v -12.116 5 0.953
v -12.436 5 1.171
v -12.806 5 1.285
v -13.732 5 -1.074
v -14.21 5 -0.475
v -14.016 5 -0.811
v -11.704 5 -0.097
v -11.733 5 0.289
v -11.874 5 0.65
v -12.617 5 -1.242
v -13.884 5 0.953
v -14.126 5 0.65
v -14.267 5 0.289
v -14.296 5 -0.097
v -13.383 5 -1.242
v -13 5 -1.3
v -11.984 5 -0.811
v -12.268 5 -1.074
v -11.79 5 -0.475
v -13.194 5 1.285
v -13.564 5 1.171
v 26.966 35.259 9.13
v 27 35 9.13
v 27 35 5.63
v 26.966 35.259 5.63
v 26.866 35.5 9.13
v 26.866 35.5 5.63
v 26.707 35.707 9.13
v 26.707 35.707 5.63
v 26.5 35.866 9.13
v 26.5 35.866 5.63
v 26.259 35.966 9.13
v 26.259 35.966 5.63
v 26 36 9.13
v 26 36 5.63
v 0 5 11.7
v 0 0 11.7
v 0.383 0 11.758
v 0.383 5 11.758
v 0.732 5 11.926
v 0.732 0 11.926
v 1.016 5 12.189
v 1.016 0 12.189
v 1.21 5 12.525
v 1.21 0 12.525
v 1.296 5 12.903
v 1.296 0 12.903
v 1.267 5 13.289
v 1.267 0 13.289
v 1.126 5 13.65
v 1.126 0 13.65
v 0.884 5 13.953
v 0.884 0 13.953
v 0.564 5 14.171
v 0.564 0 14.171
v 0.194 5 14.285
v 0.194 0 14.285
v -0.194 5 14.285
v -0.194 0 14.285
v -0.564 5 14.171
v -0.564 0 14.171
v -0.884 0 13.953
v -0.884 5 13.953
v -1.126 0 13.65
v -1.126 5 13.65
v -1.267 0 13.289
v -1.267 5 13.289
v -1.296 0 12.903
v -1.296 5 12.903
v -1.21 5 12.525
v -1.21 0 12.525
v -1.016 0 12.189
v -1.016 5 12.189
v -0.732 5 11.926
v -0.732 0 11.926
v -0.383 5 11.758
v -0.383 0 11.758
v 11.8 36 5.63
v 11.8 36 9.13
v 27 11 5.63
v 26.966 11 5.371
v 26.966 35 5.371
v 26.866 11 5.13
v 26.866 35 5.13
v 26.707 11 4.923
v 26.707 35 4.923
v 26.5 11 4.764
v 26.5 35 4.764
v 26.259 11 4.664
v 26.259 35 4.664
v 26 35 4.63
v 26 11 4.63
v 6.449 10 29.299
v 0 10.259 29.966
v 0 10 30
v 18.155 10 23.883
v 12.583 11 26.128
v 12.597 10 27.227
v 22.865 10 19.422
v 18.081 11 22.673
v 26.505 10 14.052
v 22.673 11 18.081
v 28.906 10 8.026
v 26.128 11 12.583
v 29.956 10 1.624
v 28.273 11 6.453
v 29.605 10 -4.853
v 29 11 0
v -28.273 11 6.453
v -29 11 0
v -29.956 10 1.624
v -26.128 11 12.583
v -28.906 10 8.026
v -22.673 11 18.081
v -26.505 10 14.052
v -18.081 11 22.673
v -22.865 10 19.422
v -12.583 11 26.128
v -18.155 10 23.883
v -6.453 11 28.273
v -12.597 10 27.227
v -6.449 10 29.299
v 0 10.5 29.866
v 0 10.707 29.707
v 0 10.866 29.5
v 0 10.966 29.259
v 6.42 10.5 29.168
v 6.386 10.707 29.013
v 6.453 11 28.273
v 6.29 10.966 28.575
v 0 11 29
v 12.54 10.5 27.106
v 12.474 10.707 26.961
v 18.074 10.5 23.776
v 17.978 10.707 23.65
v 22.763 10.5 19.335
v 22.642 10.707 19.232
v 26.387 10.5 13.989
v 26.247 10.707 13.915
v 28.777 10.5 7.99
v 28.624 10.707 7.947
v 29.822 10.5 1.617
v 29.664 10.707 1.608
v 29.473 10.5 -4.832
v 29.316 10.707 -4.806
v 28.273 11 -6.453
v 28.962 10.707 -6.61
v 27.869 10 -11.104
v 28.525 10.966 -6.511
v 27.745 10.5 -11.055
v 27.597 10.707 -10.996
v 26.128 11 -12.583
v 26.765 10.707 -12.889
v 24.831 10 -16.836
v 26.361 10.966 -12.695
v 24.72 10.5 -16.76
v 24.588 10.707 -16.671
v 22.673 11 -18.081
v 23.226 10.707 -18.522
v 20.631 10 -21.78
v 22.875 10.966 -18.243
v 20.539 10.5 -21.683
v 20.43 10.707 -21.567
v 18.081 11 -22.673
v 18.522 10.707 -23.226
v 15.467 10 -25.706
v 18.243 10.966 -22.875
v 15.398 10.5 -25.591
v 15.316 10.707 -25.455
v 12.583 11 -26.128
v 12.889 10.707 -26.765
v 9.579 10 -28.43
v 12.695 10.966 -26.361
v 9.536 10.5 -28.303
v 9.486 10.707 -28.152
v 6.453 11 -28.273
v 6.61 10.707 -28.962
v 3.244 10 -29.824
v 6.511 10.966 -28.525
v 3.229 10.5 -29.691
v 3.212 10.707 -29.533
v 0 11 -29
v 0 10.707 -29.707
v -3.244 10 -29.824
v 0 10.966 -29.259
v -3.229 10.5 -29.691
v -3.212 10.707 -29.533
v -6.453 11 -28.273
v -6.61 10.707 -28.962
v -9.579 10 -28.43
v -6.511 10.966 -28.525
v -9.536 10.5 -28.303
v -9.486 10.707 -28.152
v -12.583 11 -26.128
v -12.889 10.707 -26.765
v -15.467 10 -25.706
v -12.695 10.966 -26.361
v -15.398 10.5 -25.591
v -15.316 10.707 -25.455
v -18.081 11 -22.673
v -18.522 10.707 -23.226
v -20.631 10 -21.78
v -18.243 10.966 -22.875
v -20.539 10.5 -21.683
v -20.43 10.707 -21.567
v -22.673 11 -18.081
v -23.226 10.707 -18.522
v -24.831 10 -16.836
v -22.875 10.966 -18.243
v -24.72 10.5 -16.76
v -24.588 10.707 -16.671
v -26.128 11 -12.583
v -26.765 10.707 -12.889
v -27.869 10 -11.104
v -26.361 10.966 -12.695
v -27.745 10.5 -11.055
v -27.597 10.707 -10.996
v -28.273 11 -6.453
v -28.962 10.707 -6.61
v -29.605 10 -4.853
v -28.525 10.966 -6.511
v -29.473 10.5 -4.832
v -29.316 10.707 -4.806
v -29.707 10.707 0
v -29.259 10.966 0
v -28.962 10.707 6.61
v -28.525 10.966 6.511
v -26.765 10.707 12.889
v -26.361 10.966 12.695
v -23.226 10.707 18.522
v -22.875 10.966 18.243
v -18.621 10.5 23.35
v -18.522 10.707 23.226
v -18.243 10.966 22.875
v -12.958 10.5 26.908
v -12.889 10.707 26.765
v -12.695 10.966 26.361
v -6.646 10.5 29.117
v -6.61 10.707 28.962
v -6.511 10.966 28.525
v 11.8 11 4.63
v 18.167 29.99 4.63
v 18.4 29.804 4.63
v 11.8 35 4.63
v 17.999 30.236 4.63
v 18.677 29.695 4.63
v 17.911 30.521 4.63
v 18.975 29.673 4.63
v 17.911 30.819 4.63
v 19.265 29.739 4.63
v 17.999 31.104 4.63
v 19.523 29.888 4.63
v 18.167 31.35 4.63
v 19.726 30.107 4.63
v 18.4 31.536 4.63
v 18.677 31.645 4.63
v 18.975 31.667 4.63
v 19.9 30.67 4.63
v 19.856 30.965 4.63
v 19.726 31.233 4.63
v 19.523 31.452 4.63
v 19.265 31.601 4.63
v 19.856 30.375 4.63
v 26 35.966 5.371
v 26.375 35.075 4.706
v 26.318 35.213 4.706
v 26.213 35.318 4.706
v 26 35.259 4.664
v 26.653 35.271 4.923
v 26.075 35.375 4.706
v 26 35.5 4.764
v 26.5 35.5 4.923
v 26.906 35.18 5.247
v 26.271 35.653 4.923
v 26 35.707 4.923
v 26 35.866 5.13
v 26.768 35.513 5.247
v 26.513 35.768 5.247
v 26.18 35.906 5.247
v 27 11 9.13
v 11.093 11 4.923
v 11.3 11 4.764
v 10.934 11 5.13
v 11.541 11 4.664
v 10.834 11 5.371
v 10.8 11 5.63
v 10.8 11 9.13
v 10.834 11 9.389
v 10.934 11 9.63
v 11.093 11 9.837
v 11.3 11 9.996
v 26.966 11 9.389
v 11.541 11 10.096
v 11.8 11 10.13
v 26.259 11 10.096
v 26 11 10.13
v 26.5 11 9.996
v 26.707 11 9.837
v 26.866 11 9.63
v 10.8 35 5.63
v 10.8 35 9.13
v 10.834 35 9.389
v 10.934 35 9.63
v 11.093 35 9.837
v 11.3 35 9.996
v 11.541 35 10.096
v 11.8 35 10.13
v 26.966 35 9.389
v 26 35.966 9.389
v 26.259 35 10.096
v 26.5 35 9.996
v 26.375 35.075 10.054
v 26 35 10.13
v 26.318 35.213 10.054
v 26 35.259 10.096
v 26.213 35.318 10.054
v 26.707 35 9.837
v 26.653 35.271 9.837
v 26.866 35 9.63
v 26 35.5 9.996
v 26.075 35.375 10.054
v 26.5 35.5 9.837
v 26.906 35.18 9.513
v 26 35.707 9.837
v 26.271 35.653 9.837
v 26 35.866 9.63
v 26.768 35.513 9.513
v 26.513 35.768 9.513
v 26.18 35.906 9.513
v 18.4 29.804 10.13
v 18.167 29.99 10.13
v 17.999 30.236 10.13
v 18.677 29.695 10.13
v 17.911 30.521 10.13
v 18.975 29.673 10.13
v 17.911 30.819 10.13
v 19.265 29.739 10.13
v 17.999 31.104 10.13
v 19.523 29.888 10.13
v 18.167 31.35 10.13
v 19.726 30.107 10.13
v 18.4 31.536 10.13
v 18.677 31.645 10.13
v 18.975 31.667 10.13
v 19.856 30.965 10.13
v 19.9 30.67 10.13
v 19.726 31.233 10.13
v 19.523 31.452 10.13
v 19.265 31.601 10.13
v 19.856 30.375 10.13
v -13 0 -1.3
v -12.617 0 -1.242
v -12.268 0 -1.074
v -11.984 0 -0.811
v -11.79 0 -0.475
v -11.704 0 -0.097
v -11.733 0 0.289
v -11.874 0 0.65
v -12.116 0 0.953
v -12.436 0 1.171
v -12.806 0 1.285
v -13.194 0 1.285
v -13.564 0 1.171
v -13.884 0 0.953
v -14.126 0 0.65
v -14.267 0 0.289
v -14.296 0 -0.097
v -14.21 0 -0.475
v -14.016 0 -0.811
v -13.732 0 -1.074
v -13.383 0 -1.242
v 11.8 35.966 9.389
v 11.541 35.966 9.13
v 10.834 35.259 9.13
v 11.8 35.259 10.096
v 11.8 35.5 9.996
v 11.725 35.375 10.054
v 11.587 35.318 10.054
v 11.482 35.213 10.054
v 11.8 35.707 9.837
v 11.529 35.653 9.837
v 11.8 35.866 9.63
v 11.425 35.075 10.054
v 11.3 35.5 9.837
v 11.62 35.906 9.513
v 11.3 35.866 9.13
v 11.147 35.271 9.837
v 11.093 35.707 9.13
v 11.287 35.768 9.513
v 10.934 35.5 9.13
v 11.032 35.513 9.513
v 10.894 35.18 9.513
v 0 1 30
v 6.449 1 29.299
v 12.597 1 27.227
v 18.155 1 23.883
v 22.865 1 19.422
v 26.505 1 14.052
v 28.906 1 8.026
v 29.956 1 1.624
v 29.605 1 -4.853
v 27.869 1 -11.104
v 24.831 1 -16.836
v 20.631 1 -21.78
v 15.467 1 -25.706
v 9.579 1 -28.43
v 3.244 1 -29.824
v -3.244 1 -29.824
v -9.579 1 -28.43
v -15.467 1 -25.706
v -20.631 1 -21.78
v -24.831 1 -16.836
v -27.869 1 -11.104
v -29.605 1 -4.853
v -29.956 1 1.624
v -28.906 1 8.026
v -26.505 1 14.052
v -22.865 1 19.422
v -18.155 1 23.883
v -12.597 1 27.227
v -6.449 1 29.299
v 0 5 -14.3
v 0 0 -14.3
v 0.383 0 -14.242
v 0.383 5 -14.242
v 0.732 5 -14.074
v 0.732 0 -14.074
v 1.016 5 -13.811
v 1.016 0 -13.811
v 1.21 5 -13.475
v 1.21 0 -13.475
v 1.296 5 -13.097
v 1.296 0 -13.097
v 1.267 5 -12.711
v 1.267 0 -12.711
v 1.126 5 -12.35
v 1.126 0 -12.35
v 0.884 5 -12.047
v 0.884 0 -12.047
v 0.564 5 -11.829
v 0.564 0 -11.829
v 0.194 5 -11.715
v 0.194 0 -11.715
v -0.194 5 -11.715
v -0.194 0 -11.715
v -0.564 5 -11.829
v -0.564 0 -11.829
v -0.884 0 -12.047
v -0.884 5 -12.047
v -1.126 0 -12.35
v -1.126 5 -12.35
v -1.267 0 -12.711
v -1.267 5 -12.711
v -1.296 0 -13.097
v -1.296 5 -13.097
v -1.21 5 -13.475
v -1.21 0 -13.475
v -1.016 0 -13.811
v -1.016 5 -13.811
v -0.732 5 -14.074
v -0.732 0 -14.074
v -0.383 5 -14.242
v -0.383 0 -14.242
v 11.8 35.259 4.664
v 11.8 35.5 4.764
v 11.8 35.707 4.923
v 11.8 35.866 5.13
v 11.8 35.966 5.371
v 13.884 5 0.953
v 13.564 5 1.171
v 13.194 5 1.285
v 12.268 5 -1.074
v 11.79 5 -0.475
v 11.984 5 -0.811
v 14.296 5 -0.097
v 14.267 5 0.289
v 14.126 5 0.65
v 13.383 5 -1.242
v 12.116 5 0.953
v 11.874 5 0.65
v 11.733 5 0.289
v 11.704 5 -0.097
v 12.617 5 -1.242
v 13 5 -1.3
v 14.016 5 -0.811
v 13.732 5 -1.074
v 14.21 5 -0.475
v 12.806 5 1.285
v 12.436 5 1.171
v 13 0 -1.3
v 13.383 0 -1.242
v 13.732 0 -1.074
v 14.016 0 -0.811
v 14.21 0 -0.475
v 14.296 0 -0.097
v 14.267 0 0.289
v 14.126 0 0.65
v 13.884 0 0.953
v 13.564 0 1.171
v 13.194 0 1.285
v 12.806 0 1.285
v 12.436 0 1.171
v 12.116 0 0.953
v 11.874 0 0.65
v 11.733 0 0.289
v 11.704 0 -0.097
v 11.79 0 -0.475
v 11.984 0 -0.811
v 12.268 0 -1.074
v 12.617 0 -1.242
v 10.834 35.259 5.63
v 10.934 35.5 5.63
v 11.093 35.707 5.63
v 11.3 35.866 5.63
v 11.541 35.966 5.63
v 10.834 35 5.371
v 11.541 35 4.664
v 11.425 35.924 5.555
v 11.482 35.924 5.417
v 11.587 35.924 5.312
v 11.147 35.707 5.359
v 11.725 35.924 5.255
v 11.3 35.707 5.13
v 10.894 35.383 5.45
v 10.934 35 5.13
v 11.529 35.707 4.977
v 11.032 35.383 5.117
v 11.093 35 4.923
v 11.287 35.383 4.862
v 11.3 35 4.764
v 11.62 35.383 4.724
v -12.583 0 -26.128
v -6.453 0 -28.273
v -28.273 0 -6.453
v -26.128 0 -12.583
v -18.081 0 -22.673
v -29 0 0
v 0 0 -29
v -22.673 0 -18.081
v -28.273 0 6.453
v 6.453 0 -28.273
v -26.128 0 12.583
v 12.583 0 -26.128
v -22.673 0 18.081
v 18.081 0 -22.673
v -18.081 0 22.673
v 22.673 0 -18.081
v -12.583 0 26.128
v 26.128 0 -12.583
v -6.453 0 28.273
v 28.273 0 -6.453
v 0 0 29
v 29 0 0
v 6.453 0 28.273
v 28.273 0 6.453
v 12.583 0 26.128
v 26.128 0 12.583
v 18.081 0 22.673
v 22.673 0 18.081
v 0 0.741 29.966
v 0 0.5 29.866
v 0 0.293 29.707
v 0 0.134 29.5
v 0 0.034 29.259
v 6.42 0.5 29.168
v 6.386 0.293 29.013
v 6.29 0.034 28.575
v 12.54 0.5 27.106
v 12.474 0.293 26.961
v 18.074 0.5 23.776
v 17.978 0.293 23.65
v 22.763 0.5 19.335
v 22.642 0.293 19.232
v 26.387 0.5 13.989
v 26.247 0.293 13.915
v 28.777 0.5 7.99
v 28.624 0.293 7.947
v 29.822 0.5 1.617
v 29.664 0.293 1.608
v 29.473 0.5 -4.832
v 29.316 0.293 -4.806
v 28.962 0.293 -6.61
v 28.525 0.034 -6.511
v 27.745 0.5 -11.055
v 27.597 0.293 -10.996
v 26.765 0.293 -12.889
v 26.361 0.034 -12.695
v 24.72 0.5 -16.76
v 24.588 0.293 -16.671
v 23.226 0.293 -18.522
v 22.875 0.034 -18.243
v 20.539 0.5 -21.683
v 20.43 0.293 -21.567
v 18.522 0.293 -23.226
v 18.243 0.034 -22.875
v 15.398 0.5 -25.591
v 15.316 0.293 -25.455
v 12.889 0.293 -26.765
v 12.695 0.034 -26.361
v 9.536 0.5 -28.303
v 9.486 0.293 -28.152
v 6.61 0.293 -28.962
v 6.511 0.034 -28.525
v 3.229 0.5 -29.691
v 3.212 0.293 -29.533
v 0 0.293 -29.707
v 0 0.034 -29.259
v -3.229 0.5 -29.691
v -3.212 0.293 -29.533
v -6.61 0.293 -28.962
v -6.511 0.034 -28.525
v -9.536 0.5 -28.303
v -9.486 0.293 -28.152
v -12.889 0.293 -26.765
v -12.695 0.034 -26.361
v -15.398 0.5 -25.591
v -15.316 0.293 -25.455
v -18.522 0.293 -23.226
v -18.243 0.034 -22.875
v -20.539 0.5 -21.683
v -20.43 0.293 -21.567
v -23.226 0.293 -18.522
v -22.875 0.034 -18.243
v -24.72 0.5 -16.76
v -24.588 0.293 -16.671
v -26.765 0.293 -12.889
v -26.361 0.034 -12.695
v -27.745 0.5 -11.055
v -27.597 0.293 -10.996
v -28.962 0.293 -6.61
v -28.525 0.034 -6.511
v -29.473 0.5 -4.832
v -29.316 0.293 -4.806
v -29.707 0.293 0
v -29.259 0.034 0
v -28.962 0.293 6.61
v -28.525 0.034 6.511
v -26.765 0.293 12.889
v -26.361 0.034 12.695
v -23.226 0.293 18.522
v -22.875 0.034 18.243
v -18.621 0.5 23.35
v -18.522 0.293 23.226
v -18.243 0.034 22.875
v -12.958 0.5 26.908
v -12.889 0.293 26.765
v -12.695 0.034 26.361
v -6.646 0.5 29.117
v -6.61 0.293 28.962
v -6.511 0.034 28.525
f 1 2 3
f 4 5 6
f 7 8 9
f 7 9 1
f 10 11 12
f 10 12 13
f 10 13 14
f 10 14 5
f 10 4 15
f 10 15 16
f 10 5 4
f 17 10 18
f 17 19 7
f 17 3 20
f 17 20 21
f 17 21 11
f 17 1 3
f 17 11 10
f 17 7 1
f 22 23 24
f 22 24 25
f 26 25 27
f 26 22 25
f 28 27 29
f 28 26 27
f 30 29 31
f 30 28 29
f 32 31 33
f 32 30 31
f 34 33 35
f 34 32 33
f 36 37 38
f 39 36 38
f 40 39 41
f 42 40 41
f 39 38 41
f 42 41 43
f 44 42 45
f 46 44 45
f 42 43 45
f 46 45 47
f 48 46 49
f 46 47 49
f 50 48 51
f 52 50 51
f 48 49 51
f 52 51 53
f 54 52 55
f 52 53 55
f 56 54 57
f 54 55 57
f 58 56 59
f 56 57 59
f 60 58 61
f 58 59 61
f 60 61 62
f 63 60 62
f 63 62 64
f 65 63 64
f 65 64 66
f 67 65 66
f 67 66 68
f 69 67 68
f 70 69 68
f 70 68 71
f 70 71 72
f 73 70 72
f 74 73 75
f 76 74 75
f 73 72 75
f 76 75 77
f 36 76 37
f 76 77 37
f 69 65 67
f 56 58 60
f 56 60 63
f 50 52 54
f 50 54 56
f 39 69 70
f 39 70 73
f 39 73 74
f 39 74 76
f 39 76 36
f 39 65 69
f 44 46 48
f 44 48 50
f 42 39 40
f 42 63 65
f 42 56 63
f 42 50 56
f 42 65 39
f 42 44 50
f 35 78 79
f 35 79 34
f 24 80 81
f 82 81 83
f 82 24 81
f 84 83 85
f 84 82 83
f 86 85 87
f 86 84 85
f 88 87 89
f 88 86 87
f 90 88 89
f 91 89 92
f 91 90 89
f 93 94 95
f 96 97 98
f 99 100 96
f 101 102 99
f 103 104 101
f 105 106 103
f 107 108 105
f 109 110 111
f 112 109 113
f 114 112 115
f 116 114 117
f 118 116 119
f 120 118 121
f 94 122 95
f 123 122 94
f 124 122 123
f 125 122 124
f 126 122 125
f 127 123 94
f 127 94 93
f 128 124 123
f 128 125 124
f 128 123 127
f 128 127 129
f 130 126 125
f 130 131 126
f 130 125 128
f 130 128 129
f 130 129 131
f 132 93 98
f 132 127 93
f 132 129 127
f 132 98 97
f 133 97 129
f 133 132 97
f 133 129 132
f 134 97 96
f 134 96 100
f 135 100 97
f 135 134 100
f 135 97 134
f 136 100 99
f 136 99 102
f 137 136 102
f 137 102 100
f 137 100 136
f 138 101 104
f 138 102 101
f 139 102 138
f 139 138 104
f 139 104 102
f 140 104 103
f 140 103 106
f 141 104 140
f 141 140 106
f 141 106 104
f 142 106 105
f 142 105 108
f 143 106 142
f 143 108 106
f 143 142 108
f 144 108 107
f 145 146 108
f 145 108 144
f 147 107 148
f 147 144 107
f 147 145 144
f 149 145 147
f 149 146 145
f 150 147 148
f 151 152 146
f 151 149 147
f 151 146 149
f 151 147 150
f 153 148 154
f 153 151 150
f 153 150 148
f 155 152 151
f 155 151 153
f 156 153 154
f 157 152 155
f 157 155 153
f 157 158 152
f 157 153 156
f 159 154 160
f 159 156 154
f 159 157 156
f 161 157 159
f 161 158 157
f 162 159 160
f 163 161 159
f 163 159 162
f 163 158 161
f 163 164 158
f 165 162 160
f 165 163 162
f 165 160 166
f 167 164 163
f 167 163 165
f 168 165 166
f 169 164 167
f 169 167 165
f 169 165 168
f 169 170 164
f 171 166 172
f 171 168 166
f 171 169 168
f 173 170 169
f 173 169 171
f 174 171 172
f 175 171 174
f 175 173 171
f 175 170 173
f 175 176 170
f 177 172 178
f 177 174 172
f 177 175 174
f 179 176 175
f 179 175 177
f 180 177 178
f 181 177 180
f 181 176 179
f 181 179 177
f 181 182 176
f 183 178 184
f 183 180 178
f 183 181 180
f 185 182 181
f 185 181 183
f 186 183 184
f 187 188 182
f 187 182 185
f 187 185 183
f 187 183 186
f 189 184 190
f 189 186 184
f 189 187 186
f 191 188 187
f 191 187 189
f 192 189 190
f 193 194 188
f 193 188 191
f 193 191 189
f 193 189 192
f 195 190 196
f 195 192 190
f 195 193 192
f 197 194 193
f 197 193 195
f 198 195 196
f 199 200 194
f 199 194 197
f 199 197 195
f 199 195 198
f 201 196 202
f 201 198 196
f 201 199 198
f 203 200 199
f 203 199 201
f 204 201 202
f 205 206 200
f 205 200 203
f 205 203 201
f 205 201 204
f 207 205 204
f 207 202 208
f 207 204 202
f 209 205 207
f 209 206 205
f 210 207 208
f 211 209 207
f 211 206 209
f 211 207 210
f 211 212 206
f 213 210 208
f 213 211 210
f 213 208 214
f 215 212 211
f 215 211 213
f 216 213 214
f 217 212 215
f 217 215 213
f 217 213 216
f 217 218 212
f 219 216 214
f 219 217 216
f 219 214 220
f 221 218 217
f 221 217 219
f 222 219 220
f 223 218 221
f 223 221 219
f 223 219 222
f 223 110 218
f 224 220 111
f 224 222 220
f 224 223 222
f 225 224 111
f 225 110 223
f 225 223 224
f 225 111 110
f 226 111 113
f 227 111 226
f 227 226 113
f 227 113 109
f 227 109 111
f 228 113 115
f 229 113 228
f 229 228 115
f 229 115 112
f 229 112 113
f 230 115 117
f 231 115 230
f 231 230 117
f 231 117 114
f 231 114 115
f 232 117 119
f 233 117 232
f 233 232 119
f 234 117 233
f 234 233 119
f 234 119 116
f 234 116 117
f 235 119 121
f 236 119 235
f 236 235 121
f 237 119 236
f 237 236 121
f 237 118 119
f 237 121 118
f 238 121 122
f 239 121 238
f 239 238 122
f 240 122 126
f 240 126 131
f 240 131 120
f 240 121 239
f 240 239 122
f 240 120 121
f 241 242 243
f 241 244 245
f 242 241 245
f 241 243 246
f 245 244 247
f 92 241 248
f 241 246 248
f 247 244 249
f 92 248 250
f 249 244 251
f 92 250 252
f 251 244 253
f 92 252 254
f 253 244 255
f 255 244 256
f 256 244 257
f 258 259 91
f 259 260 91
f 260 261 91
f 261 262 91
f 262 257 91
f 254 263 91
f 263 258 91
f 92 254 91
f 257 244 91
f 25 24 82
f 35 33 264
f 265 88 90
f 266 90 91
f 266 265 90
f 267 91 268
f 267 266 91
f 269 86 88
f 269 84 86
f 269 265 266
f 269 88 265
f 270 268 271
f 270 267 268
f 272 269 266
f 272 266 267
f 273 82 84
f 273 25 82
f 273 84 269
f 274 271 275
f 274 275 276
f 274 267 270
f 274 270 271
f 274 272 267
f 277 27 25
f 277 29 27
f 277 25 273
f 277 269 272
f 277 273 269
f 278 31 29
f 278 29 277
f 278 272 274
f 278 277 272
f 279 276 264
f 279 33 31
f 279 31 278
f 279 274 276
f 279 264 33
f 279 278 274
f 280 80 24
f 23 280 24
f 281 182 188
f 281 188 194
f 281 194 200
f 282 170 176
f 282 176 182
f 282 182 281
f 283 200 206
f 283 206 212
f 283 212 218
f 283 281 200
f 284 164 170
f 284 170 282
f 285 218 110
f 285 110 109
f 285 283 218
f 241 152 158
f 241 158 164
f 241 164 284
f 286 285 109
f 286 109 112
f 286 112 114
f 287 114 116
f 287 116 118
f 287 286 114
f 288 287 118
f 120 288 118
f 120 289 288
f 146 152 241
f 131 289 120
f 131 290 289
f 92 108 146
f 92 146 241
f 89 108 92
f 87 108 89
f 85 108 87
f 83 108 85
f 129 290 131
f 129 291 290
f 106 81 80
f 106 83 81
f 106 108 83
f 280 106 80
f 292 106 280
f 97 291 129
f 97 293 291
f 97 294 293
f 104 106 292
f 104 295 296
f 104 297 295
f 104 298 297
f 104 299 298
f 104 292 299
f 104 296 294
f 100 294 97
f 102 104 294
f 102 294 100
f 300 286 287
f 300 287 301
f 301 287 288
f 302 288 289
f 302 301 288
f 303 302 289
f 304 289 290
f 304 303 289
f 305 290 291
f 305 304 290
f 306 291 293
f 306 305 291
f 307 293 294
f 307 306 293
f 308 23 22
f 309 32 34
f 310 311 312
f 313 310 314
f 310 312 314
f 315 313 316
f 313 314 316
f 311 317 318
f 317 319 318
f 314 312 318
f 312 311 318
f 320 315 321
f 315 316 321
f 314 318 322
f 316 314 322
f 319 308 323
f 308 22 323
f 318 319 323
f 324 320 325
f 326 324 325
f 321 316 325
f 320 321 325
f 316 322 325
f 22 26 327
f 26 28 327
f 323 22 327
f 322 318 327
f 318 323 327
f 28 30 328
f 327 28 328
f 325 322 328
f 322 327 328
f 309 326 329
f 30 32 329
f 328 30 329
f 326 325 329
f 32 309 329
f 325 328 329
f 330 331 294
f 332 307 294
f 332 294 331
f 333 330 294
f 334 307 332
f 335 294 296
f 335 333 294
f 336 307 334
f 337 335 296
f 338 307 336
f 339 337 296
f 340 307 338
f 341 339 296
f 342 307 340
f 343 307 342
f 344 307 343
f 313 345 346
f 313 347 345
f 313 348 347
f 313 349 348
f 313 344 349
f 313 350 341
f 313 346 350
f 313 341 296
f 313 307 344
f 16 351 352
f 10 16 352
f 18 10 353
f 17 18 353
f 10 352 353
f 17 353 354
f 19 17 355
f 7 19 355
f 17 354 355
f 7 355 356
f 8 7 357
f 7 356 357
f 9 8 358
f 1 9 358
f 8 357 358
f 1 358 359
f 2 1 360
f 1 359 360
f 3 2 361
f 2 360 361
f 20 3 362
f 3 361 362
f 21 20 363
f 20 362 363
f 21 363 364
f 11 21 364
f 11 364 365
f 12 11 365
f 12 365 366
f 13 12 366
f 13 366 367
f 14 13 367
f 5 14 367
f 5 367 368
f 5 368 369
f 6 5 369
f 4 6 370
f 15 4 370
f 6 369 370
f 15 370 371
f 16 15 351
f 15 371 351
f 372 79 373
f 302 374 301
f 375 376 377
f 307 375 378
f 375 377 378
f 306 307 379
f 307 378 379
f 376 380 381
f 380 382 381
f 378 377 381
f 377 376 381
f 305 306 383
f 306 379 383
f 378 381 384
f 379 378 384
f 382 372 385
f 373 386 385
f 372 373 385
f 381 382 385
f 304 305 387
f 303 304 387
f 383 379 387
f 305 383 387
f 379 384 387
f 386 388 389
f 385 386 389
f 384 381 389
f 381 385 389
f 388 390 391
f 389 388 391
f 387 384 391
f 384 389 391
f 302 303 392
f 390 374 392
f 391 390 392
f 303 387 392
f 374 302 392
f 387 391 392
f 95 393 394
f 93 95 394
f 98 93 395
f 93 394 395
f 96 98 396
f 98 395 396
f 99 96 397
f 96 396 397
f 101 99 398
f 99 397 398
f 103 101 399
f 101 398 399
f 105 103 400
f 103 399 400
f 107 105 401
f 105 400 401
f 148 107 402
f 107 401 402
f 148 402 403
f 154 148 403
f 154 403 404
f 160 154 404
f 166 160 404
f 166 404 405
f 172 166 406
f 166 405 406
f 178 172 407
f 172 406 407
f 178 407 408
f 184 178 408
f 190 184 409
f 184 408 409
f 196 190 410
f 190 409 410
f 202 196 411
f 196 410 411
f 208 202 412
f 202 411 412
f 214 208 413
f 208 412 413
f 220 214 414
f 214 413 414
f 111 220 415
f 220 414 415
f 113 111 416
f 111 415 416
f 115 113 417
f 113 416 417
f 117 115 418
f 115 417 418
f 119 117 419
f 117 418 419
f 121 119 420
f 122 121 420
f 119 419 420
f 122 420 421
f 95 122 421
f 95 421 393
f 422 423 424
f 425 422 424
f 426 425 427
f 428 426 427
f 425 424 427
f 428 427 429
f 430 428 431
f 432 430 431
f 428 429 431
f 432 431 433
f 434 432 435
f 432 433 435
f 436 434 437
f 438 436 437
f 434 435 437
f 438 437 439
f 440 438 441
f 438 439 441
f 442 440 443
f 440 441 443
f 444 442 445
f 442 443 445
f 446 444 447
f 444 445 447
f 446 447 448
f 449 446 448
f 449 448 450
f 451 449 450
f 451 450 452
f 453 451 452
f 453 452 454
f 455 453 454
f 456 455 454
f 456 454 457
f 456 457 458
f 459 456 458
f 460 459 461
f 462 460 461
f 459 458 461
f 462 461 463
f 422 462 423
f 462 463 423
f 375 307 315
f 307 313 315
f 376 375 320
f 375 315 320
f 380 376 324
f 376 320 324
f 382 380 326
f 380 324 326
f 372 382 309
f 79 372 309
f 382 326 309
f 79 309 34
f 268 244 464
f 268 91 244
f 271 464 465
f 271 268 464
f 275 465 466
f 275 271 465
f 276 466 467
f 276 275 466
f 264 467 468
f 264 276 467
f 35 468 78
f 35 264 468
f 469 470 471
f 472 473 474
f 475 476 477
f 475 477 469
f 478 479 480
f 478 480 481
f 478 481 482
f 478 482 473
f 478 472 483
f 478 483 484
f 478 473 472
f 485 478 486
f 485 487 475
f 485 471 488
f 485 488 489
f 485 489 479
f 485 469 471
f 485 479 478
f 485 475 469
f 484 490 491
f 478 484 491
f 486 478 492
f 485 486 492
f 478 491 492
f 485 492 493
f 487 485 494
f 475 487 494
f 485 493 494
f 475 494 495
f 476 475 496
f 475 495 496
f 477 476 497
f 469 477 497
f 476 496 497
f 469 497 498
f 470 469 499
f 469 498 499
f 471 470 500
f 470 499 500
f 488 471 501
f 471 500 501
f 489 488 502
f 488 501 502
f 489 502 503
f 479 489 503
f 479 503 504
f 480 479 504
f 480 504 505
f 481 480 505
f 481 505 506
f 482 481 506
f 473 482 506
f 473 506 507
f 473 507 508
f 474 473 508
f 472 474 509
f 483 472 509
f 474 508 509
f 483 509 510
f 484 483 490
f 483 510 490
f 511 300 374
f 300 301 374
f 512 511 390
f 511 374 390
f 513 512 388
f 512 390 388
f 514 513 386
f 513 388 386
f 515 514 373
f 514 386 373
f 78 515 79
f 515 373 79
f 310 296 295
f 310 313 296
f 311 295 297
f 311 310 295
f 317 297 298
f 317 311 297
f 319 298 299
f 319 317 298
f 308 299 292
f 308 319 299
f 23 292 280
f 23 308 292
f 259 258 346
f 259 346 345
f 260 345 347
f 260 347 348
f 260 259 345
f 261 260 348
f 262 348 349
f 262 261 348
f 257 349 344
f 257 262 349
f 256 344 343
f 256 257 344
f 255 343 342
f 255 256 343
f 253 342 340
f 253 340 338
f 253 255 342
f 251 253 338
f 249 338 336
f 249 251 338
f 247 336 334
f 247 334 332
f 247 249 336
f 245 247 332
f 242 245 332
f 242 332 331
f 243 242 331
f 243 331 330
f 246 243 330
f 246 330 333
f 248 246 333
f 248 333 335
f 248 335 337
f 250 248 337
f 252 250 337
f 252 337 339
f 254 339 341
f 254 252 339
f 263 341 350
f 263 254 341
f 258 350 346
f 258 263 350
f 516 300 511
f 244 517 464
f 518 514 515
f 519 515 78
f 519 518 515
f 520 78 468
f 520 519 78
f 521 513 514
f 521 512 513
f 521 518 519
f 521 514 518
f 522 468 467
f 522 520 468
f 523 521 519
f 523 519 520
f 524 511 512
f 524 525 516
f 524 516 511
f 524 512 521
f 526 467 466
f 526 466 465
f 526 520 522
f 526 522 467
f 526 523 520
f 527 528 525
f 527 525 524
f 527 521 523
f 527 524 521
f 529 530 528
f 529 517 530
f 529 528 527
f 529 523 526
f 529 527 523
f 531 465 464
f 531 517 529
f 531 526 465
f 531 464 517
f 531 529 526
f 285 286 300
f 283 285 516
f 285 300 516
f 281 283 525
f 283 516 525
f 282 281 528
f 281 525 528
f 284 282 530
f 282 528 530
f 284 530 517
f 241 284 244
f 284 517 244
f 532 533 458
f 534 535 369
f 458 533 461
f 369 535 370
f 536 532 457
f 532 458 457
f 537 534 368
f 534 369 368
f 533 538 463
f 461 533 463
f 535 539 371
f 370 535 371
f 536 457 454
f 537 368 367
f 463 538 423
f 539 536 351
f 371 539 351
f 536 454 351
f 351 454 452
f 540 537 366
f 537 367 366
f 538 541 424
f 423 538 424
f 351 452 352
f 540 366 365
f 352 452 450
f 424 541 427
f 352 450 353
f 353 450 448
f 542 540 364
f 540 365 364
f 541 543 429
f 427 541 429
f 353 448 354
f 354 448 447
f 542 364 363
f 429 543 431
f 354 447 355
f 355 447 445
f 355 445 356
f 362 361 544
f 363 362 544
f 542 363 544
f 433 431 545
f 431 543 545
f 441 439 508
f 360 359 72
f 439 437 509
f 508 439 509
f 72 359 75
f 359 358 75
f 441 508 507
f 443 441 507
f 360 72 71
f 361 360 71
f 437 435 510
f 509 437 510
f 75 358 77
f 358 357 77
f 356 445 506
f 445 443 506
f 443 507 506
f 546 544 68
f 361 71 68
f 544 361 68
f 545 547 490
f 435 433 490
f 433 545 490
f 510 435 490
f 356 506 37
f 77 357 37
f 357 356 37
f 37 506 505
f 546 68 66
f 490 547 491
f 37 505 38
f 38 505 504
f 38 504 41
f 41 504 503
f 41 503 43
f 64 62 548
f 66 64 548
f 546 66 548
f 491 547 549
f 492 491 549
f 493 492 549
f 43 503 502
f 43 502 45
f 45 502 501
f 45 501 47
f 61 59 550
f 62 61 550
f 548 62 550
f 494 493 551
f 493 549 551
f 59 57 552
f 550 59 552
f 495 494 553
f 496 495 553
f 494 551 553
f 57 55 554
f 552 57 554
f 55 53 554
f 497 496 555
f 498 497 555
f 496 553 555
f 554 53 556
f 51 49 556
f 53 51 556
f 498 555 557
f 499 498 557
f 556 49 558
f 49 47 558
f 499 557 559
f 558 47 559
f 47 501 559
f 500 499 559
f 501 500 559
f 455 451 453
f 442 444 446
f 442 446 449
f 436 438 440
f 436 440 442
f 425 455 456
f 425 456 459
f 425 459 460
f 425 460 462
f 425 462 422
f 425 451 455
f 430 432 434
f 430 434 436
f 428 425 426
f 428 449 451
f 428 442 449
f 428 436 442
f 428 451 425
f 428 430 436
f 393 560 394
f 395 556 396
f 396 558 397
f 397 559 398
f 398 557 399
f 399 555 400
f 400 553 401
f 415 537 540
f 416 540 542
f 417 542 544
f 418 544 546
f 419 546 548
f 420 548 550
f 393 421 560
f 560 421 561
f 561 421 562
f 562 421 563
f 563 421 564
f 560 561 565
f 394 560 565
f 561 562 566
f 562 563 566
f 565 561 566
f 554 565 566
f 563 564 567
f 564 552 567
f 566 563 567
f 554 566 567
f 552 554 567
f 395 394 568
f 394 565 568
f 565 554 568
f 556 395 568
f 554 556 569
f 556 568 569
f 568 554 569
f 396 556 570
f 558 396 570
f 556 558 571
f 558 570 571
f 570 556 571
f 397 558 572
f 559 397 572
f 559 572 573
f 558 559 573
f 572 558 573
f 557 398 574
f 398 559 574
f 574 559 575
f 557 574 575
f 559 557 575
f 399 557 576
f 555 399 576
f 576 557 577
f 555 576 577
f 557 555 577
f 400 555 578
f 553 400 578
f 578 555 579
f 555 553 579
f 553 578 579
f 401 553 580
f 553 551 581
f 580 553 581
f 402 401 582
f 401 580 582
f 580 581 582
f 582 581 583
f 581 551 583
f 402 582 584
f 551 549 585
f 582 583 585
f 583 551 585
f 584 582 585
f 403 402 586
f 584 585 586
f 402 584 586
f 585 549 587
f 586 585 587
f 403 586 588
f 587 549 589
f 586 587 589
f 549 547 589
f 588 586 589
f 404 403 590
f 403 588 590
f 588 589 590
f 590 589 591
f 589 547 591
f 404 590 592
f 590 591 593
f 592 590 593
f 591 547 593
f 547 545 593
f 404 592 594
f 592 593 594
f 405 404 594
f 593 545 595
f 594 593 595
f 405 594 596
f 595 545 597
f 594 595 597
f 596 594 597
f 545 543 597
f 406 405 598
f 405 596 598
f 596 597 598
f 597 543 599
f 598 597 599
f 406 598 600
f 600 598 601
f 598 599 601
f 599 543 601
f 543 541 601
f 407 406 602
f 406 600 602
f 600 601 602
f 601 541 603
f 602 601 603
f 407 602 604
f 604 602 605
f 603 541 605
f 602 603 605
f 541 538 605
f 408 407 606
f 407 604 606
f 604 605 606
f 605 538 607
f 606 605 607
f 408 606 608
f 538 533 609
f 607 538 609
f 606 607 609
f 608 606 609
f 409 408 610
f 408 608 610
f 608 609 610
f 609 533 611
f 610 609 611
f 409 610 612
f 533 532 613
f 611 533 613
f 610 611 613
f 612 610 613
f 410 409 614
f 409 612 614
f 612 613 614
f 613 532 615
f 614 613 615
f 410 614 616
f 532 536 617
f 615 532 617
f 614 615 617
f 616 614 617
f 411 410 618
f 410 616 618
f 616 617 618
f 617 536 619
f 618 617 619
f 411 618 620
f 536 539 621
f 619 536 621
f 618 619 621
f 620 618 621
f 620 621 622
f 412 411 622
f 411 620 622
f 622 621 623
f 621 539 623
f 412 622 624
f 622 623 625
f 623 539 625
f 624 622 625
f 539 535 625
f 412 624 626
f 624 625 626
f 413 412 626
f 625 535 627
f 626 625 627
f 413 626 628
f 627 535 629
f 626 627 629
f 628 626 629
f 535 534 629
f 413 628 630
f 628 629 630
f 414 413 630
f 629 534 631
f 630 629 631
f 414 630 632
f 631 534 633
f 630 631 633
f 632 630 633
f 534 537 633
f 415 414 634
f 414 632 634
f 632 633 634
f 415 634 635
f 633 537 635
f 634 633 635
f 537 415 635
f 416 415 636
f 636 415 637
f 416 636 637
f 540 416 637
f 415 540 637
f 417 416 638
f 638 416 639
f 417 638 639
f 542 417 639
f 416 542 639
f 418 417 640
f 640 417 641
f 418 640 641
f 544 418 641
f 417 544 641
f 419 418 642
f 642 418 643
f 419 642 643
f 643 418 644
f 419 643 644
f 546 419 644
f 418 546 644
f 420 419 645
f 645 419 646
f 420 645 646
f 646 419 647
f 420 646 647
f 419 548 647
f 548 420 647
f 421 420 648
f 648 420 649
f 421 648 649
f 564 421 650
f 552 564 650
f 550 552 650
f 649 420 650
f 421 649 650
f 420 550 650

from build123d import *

# Parameters (mm, degrees)
SKETCH_2_R          = 30
EXTRUDE_1_DEPTH     = 11
SKETCH_3_W          = 16.2
SKETCH_3_H          = 25
SKETCH_3_R          = 1
EXTRUDE_2_DEPTH     = 5.5
FILLET_1_R          = 1
SKETCH_4_R          = 1.3
CUT_EXTRUDE_1_DEPTH = 5


with BuildPart() as part:
    # 草图2 → 凸台-拉伸1 (new body)
    with BuildSketch(Plane(origin=(0, 0, 0), x_dir=(1, 0, 0), z_dir=(0, 1, 0))):
        with Locations(Location((0, 0, 0), (0, 0, 270))):
            Circle(SKETCH_2_R)
    extrude(amount=EXTRUDE_1_DEPTH)

    # 草图3 → 凸台-拉伸2 (add)
    with BuildSketch(Plane.XY.offset(4.63)):
        with Locations((18.9, 23.5)):
            Rectangle(SKETCH_3_W, SKETCH_3_H)
        with Locations((18.9, 30.67)):
            Circle(SKETCH_3_R, mode=Mode.SUBTRACT)
    extrude(amount=EXTRUDE_2_DEPTH)

    # 圆角1
    fillet_1_edges = [part.edges().sort_by_distance(p)[0] for p in [
        (27, 36, 7.38),
        (10.8, 23.5, 4.63),
        (10.8, 36, 7.38),
        (0, 0, -30),
        (0, 11, -30),
        (27, 23.5, 10.13),
        (18.9, 36, 10.13),
        (10.8, 23.5, 10.13),
        (27, 23.5, 4.63),
        (18.9, 36, 4.63),
    ]]
    fillet(fillet_1_edges, radius=FILLET_1_R)

    # 草图4 → 切除-拉伸1 (cut)
    with BuildSketch(Plane(origin=(0, 0, 0), x_dir=(-1, 0, 0), z_dir=(0, -1, 0))):
        with Locations(Location((0, -13, 0), (0, 0, 90))):
            Circle(SKETCH_4_R)
        with Locations(Location((-13, 0, 0), (0, 0, 90))):
            Circle(SKETCH_4_R)
        with Locations(Location((0, 13, 0), (0, 0, 90))):
            Circle(SKETCH_4_R)
        with Locations(Location((13, 0, 0), (0, 0, 90))):
            Circle(SKETCH_4_R)
    extrude(amount=-CUT_EXTRUDE_1_DEPTH, mode=Mode.SUBTRACT)


solid = part.part
